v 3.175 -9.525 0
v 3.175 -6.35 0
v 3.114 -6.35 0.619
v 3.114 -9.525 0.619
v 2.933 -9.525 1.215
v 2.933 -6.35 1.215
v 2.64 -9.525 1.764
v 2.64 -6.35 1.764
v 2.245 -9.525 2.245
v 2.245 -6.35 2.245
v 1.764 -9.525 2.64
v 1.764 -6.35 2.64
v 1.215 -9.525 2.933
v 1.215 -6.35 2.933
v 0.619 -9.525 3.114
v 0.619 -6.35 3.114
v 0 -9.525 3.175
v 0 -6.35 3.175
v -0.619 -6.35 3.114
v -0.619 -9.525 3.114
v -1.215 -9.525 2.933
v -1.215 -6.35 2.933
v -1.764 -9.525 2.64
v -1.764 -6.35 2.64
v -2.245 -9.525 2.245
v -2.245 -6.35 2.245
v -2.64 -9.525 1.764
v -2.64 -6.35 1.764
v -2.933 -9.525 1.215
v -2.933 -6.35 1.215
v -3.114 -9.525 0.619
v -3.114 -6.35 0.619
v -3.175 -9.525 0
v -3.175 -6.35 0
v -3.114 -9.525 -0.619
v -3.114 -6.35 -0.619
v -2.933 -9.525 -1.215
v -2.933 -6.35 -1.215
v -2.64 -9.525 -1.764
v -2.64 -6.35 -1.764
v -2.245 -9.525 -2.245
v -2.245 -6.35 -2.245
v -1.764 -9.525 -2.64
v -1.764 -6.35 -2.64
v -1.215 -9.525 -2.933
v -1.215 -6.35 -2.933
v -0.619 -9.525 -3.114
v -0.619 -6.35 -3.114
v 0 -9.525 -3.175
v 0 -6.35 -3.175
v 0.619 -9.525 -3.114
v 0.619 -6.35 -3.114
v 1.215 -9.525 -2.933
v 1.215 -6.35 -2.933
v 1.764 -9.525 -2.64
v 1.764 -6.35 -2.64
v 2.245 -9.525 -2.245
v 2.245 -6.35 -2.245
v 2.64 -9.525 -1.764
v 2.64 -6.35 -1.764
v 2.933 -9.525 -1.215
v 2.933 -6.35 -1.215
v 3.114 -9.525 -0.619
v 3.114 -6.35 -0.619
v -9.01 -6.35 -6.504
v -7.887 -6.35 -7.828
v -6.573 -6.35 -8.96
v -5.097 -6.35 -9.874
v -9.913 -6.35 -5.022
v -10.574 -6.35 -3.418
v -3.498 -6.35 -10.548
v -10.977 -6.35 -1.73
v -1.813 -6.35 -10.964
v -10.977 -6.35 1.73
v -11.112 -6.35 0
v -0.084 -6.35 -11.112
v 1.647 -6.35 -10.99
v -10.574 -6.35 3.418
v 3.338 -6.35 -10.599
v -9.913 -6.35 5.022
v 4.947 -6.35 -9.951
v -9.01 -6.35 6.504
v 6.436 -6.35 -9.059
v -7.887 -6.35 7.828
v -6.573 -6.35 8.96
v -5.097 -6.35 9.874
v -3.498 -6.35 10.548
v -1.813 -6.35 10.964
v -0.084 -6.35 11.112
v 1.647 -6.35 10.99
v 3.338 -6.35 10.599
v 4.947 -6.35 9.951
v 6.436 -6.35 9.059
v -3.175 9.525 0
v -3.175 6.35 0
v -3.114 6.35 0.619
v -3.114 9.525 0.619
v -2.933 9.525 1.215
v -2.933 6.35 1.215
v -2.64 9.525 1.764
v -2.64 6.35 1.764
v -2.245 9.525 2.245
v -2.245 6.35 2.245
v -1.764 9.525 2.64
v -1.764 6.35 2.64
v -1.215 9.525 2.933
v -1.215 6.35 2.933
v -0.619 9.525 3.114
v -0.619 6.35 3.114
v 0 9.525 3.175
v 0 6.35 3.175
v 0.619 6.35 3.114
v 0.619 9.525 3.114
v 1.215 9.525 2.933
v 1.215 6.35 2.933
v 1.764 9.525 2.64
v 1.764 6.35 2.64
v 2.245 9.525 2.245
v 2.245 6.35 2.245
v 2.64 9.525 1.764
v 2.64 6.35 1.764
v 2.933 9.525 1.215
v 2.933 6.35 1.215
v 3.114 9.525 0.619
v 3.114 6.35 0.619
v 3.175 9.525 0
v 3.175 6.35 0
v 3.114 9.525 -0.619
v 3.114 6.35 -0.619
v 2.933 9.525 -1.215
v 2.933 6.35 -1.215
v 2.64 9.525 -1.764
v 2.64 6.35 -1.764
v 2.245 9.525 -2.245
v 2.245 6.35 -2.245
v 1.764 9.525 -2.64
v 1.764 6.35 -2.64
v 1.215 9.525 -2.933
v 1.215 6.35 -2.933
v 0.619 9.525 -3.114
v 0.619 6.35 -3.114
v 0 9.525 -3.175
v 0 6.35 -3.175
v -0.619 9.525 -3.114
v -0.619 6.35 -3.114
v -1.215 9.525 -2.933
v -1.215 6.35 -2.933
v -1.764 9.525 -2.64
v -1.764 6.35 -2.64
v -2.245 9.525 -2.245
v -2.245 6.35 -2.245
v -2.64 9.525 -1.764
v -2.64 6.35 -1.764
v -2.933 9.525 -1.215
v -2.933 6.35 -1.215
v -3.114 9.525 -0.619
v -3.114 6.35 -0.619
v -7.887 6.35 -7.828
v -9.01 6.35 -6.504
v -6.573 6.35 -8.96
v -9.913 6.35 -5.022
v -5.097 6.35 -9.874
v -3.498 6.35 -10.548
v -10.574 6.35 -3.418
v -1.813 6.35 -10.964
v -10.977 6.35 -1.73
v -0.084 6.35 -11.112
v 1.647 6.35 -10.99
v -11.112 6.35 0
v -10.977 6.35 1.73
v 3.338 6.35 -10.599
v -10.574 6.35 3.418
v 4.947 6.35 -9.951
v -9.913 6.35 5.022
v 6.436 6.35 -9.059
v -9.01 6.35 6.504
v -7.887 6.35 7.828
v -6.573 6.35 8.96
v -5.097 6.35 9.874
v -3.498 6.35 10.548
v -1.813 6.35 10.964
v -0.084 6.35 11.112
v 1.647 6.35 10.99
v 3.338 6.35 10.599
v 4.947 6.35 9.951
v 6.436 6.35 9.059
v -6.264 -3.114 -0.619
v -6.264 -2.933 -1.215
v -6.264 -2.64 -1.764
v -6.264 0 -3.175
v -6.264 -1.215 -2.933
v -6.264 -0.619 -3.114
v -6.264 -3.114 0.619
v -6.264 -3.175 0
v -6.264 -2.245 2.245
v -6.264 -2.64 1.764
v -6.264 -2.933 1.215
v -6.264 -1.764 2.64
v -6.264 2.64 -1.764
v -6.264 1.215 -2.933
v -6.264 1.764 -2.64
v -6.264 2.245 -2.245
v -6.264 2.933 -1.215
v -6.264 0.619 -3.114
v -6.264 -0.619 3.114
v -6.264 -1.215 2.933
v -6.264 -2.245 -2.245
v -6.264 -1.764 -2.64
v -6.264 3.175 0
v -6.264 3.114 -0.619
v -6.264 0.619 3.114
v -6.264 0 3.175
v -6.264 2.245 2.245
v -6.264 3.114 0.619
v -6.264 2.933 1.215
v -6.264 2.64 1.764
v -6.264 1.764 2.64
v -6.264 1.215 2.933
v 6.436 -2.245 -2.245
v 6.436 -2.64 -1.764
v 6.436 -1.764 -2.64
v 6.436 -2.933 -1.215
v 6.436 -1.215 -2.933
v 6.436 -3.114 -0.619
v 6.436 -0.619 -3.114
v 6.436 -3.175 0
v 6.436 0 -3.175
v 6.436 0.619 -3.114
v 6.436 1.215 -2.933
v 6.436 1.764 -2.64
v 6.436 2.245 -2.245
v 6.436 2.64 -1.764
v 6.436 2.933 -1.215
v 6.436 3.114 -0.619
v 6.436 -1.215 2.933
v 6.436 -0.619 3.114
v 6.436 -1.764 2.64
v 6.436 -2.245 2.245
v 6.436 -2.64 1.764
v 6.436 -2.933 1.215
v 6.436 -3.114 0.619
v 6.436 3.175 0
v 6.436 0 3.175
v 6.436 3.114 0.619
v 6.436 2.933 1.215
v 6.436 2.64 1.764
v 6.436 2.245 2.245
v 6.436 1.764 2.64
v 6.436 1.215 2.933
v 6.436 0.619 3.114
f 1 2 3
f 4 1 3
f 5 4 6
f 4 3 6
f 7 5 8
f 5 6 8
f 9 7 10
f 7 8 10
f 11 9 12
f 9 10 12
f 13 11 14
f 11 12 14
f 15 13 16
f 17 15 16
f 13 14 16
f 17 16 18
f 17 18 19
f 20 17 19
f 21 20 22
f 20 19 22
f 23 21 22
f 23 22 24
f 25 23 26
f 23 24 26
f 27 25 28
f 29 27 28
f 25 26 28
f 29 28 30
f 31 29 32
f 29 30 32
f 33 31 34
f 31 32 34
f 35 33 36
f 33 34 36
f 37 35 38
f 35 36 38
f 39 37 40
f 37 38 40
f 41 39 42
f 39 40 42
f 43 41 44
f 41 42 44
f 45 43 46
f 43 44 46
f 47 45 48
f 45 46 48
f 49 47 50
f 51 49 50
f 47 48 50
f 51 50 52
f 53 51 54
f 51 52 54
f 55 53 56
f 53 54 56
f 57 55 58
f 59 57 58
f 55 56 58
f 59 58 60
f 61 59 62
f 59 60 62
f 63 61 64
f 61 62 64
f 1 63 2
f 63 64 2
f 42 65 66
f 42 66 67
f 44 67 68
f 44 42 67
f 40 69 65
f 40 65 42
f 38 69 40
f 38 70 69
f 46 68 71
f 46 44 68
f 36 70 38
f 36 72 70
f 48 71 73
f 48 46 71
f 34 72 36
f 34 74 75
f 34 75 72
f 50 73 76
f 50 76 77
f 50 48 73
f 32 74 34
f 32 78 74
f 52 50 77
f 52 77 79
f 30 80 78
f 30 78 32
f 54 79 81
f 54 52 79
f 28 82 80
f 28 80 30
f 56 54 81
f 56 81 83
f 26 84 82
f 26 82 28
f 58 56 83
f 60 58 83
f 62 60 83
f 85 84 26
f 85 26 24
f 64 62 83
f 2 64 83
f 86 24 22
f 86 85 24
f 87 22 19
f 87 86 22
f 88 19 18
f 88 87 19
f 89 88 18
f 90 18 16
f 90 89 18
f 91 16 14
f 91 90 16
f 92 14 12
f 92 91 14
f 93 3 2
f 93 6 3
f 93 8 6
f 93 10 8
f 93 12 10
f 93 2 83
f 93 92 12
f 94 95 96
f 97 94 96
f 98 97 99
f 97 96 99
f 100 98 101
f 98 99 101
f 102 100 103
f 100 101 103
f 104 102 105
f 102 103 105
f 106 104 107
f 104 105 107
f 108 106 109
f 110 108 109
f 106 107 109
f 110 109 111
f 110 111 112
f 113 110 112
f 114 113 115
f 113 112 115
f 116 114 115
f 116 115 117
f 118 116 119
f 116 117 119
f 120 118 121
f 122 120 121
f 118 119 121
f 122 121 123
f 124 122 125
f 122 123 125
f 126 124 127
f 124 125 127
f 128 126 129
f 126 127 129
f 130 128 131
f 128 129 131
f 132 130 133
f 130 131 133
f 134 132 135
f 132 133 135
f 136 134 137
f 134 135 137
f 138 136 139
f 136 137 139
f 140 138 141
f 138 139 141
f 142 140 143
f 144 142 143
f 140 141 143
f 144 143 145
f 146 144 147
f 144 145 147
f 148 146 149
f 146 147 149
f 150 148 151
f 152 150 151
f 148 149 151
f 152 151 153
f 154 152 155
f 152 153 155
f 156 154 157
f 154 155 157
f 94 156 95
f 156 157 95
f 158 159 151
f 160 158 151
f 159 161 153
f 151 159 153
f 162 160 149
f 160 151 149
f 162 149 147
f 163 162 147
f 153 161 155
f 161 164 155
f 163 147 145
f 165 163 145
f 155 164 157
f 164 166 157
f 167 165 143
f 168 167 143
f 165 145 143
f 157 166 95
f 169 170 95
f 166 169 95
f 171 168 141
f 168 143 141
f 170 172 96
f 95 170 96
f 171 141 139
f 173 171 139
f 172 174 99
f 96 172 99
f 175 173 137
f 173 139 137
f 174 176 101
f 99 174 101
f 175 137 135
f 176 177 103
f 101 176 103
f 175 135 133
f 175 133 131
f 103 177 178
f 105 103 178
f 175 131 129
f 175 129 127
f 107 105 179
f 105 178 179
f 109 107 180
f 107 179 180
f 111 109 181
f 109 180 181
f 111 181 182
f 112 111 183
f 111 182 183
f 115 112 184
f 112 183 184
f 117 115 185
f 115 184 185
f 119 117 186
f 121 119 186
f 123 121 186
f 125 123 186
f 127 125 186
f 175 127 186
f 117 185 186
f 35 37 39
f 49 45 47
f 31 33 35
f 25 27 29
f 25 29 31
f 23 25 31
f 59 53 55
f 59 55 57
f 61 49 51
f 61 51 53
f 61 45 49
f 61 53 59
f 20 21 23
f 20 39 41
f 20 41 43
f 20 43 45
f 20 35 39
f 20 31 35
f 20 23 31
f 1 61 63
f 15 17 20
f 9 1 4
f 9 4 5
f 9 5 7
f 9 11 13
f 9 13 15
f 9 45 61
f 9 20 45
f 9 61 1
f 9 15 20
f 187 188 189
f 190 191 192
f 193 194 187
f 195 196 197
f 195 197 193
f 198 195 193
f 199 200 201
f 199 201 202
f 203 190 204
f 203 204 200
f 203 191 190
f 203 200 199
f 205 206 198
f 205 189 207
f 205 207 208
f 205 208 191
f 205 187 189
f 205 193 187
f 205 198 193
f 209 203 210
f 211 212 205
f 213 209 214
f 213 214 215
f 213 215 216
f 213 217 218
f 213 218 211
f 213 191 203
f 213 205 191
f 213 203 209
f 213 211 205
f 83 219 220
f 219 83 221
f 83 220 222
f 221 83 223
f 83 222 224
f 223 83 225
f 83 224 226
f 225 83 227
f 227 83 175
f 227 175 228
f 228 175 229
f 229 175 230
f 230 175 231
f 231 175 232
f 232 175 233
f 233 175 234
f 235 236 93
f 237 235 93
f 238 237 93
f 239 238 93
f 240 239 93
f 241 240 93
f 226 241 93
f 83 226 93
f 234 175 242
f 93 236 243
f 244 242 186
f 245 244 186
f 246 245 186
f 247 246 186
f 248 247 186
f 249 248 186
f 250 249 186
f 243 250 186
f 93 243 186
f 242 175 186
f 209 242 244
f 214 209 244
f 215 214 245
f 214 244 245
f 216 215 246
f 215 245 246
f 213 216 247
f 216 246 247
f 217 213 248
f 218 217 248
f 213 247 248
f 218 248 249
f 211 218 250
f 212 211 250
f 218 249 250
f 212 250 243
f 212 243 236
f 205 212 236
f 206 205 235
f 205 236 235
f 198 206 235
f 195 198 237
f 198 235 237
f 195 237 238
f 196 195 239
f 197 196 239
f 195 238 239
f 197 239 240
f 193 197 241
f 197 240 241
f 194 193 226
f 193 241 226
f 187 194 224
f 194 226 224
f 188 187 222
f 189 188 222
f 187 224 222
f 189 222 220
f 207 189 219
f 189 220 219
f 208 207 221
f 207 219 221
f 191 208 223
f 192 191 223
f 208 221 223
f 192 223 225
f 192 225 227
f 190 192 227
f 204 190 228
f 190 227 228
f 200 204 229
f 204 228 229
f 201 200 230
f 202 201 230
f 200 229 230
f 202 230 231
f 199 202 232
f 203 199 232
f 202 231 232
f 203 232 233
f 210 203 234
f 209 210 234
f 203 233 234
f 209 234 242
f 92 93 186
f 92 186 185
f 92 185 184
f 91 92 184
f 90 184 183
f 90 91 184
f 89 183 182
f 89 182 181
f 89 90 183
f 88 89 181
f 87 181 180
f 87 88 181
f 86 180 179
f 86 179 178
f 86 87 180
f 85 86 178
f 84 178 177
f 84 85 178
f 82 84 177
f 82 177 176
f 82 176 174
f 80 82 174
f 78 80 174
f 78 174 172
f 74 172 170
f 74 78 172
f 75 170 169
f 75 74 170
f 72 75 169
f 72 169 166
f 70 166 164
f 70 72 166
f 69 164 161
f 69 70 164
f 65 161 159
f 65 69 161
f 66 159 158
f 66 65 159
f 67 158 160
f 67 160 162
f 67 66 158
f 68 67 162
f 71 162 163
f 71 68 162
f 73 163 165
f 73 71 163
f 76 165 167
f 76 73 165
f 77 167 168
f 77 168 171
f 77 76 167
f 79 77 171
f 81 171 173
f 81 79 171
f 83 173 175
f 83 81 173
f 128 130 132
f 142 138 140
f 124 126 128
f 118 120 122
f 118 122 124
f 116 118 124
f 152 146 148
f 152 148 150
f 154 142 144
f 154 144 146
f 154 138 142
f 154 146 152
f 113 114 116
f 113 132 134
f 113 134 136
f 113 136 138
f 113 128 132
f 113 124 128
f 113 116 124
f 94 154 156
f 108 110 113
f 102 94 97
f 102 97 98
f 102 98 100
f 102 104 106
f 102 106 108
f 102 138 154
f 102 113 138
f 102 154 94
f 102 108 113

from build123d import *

# Parameters (mm, degrees)
F0_R     = 11.1125
F1_DEPTH = 6.35
F2_R     = 3.175
F3_DEPTH = 3.175
F4_R     = 3.175
F5_DEPTH = 3.175
F7_DEPTH = 25.4
F8_R     = 3.175
F9_DEPTH = 12.7


with BuildPart() as f1:
    # F0 (on Front) → F1 (new body, symmetric)
    with BuildSketch(Plane.XZ):
        Circle(F0_R)
    extrude(amount=F1_DEPTH, both=True)

    # F2 (on face) → F3 (join)
    with BuildSketch(Plane.XZ.offset(6.35)):
        Circle(F2_R)
    extrude(amount=F3_DEPTH)

    # F4 (on face) → F5 (join)
    with BuildSketch(Plane(origin=(0, 6.35, 0), x_dir=(-1, 0, 0), z_dir=(0, 1, 0))):
        Circle(F4_R)
    extrude(amount=F5_DEPTH)

    # F6 (on face) → F7 (cut)
    with BuildSketch(Plane(origin=(0, 9.525, 0), x_dir=(-1, 0, 0), z_dir=(0, 1, 0))):
        with BuildLine():
            ThreePointArc((-6.4359051175, 9.0590717829), (-11.1125, 0), (-6.4359051175, -9.0590717829))
            Line((-6.4359051175, -9.0590717829), (-6.4359051175, 9.0590717829))
        make_face()
    extrude(amount=-F7_DEPTH, mode=Mode.SUBTRACT)

    # F8 (on face) → F9 (cut)
    with BuildSketch(Plane.YZ.offset(6.4359051175)):
        Circle(F8_R)
    extrude(amount=-F9_DEPTH, mode=Mode.SUBTRACT)


solid = f1.part
